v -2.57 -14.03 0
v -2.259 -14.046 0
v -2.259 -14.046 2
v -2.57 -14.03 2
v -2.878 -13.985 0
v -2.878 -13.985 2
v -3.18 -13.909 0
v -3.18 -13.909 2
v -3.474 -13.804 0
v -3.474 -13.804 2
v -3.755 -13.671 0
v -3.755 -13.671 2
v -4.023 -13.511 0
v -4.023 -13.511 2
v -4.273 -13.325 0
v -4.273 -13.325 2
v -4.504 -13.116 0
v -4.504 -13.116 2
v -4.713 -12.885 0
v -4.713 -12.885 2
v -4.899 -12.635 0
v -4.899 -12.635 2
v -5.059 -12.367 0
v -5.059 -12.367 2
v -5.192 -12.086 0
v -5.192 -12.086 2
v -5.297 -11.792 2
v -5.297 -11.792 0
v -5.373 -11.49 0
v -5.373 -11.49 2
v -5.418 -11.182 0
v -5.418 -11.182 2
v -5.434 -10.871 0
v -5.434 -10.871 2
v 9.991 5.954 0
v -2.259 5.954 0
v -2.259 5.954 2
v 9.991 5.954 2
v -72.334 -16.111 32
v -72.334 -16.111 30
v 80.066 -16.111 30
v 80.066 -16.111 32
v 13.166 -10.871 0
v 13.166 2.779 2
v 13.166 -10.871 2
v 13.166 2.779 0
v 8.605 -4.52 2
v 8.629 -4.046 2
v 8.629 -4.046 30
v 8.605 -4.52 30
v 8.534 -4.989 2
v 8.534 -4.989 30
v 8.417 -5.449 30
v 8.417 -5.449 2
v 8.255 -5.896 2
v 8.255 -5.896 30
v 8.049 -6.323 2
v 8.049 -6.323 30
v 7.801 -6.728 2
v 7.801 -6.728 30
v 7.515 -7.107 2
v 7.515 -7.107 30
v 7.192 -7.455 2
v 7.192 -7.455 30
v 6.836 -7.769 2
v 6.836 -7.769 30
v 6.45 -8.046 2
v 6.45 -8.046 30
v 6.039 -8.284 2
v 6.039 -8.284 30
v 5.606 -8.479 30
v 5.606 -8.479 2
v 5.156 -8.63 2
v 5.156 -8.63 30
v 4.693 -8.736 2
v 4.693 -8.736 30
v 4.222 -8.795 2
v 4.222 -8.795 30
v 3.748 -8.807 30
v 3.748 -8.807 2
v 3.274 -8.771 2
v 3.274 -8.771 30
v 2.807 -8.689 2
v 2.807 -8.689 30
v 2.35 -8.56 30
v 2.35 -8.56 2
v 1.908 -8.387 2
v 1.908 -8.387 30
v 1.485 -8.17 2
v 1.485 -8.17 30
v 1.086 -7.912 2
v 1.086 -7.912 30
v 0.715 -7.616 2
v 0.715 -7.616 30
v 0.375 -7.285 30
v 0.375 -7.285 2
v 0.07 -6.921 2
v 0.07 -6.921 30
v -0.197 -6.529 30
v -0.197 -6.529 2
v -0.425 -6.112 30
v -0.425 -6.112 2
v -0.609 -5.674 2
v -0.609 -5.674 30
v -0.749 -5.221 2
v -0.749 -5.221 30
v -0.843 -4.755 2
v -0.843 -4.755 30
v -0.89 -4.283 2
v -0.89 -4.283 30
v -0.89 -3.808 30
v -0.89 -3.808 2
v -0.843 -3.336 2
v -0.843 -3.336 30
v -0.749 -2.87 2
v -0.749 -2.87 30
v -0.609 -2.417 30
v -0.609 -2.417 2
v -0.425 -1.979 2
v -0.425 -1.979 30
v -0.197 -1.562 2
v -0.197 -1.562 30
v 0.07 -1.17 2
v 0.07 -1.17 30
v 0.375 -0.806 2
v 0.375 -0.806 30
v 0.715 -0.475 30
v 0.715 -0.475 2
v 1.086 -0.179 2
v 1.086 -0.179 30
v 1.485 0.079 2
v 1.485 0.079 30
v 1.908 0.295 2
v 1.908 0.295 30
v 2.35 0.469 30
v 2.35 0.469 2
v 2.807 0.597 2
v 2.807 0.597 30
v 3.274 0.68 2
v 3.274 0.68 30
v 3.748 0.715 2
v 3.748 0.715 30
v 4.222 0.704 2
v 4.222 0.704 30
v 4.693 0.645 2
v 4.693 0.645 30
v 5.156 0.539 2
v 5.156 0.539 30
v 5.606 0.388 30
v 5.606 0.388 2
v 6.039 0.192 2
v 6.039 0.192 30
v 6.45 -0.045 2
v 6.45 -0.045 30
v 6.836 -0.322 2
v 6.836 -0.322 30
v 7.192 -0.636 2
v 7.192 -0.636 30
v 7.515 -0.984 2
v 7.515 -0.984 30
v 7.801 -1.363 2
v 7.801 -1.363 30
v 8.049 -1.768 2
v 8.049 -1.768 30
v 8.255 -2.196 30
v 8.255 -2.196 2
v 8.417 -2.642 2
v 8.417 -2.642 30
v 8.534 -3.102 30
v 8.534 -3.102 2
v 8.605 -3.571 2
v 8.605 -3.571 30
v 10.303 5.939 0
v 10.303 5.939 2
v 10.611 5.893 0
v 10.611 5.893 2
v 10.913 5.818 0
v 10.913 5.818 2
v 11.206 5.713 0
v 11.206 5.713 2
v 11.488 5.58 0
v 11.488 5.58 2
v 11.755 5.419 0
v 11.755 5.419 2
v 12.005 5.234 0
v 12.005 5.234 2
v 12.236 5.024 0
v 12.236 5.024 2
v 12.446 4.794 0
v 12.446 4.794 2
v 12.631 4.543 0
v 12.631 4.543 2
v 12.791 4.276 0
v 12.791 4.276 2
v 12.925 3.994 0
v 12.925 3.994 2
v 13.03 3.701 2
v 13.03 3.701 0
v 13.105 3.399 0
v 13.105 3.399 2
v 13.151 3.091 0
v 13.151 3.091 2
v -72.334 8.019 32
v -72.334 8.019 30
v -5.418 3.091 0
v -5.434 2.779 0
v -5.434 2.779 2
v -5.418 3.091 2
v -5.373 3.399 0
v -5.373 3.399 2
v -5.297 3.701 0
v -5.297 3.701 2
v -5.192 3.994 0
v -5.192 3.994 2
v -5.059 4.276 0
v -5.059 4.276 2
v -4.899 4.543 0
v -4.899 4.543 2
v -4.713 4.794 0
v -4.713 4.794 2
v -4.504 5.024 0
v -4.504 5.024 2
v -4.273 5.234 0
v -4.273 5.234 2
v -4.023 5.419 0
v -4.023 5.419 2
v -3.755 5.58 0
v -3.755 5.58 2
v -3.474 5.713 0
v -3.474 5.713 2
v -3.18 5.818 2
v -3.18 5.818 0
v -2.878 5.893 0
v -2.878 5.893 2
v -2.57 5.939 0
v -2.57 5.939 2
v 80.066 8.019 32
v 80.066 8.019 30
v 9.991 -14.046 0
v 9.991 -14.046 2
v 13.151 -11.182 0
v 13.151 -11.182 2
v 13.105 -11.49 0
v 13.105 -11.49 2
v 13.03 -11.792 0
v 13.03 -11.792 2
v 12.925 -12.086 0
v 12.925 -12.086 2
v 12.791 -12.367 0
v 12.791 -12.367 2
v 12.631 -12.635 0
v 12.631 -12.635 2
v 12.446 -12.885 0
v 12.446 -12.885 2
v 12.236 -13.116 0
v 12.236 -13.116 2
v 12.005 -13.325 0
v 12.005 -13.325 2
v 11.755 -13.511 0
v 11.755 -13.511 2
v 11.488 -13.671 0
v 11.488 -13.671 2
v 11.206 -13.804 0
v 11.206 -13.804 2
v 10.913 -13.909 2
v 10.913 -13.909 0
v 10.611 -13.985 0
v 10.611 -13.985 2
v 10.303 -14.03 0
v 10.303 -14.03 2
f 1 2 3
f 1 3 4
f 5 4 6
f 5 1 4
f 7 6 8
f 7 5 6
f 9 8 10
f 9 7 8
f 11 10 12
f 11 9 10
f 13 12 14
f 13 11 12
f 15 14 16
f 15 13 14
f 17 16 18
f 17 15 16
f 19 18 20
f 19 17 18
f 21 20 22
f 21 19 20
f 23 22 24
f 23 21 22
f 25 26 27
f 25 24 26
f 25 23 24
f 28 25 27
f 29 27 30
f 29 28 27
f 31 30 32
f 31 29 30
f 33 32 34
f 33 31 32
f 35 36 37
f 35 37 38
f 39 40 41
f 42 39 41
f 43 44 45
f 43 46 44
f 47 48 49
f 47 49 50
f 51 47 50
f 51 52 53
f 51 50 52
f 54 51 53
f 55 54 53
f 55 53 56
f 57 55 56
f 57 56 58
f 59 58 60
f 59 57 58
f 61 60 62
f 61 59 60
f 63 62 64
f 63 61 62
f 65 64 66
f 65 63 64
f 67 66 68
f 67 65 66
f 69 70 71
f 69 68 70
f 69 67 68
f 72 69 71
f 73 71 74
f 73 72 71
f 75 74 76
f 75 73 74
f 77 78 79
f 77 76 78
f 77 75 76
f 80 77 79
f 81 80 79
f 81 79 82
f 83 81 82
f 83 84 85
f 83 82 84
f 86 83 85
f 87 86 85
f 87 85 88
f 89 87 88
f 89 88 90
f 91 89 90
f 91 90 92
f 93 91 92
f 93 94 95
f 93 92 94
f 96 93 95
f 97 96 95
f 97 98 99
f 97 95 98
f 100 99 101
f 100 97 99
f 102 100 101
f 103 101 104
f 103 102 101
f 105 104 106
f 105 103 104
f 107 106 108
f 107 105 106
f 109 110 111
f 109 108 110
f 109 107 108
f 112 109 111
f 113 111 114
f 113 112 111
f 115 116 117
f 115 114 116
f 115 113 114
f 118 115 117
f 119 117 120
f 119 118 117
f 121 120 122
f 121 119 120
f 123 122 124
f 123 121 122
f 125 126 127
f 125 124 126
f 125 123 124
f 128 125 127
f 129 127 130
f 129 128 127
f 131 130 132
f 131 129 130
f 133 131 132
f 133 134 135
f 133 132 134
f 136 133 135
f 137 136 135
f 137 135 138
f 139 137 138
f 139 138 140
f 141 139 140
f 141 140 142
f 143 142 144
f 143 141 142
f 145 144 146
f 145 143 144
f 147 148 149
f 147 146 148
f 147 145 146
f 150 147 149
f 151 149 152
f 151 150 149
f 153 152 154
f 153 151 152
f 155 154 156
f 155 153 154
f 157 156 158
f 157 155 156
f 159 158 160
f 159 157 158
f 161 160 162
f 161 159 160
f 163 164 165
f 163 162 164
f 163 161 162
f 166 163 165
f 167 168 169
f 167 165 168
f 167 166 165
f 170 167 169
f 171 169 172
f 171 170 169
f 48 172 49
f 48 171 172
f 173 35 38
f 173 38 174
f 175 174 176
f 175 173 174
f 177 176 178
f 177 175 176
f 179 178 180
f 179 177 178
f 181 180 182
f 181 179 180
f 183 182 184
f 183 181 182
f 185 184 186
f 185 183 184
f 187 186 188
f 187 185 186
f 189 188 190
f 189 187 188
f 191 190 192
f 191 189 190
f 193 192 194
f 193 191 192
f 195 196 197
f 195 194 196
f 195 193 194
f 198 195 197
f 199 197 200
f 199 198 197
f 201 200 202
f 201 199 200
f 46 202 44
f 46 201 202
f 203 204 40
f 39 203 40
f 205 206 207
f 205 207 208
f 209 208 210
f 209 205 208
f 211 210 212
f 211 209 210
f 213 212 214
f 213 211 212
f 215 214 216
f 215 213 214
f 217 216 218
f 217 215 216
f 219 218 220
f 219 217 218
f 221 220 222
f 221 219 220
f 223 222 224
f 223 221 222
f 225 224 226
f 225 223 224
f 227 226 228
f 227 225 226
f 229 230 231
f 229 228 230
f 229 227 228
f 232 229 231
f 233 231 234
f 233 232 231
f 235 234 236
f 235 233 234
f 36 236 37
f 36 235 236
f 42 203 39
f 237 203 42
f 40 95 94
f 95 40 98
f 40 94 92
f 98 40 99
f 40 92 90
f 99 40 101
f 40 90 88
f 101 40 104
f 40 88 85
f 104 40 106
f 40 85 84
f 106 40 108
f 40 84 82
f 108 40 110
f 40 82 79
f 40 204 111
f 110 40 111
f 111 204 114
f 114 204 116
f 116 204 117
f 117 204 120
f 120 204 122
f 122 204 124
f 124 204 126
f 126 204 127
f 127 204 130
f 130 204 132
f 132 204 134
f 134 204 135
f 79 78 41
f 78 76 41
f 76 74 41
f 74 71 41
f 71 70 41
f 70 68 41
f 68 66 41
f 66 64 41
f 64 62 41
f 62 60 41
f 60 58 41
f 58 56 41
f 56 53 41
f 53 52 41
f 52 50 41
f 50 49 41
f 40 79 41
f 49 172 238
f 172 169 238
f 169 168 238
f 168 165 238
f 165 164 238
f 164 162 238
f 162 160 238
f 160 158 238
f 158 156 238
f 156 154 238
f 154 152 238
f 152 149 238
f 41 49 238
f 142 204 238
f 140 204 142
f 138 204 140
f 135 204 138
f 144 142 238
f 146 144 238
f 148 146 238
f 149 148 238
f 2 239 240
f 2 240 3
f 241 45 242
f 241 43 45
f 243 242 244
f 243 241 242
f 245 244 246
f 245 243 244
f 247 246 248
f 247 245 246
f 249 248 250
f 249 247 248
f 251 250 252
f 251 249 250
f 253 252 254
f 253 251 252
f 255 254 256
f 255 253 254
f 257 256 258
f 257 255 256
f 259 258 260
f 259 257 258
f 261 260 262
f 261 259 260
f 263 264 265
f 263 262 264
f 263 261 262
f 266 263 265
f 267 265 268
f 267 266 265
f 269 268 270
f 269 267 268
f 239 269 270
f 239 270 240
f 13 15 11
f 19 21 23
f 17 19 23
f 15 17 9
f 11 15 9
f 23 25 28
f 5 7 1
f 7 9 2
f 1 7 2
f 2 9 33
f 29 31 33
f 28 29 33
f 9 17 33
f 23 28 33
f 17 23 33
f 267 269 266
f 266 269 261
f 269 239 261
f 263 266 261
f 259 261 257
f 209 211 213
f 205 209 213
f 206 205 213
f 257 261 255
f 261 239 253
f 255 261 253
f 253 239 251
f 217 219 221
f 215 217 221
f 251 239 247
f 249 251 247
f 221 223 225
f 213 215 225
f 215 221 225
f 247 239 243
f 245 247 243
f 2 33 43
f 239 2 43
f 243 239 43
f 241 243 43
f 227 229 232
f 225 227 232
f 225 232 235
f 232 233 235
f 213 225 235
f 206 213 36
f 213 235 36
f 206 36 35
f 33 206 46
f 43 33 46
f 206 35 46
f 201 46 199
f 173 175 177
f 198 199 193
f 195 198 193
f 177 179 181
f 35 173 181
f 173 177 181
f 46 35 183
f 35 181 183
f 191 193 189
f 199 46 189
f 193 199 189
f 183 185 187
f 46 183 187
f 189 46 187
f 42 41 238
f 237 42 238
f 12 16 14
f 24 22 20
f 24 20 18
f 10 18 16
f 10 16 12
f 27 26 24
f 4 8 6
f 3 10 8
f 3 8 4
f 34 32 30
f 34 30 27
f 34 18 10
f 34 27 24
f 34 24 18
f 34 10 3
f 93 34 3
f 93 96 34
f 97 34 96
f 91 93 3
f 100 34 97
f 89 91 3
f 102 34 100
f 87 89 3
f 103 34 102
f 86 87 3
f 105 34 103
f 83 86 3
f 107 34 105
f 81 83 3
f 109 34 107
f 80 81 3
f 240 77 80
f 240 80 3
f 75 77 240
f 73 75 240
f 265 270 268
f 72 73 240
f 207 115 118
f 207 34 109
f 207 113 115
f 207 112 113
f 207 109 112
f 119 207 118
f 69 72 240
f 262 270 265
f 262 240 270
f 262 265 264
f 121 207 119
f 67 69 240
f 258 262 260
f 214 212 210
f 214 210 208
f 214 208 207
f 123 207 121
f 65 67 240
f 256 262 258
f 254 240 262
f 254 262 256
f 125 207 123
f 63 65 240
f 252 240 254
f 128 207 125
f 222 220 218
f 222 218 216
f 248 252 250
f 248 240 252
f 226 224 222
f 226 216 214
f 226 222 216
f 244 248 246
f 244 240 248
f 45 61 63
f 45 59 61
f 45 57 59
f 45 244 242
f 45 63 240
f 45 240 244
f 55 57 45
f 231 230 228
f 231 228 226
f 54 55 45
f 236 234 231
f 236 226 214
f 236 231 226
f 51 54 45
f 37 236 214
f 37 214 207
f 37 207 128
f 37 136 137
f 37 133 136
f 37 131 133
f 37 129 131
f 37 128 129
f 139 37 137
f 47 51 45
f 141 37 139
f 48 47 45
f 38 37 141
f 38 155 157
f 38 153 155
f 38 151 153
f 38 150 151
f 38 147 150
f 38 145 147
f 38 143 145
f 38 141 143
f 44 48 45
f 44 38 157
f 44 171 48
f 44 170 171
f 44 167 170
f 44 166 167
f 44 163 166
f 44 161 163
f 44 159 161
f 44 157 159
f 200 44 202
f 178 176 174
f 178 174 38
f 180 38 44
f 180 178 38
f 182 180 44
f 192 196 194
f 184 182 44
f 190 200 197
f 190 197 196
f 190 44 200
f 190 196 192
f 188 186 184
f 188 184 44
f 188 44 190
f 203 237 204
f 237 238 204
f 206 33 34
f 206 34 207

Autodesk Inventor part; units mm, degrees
ref_plane "YZ Plane" through (0, 0, 0) normal (1, 0, 0) x (0, 1, 0)
ref_plane "XZ Plane" through (0, 0, 0) normal (0, 1, 0) x (-1, 0, 0)
ref_plane "XY Plane" through (0, 0, 0) normal (0, 0, 1) x (1, 0, 0)
sketch "Sketch1" plane through (0, 0, 0) normal (0, 0, 1) x (1, 0, 0)
  line L0 (-2.2587, 5.9544) -> (9.9913, 5.9544)
  line L1 (13.1663, 2.7794) -> (13.1663, -10.8706)
  line L2 (9.9913, -14.0456) -> (-2.2587, -14.0456)
  line L3 (-5.4337, -10.8706) -> (-5.4337, 2.7794)
  arc A0 (13.1663, 2.7794) -> (9.9913, 5.9544) centre (9.9913, 2.7794) ccw
  arc A1 (9.9913, -14.0456) -> (13.1663, -10.8706) centre (9.9913, -10.8706) ccw
  arc A2 (-5.4337, -10.8706) -> (-2.2587, -14.0456) centre (-2.2587, -10.8706) ccw
  arc A3 (-2.2587, 5.9544) -> (-5.4337, 2.7794) centre (-2.2587, 2.7794) ccw
  point P0 (0, 0)
  point P1 (13.1663, -14.0456)
  point P2 (13.1663, 5.9544)
  point P3 (-5.4337, -14.0456)
  dimension "d0" = 18.6
  dimension "d1" = 20
  dimension "d2" = 3.175
extrude "Extrusion1" add sketch "Sketch1" along normal blind 2
sketch "Sketch2" plane through (0, 0, 2) normal (0, 0, 1) x (1, 0, 0)
  arc A0 (-2.2587, 5.9544) -> (-5.4337, 2.7794) centre (-2.2587, 2.7794) ccw projected
  arc A1 (9.9913, -14.0456) -> (13.1663, -10.8706) centre (9.9913, -10.8706) ccw projected
  line L0 (-2.2587, 2.7794) -> (9.9913, -10.8706) construction
  arc A2 (13.1663, 2.7794) -> (9.9913, 5.9544) centre (9.9913, 2.7794) ccw projected
  arc A3 (-5.4337, -10.8706) -> (-2.2587, -14.0456) centre (-2.2587, -10.8706) ccw projected
  line L1 (9.9913, 2.7794) -> (-2.2587, -10.8706) construction
  circle A4 centre (3.8663, -4.0456) radius 4.7625
  point P0 (0, 0)
  dimension "d5" = 9.525
extrude "Extrusion2" add sketch "Sketch2" along normal blind 28
sketch "Sketch3" plane through (3.8663, -4.0456, 30) normal (0, 0, 1) x (1, 0, 0)
  line L0 (-76.2, -12.065) -> (76.2, -12.065)
  line L1 (76.2, -12.065) -> (76.2, 12.065)
  line L2 (76.2, 12.065) -> (-76.2, 12.065)
  line L3 (-76.2, 12.065) -> (-76.2, -12.065)
  line L4 (-76.2, -12.065) -> (76.2, 12.065) construction
  line L5 (76.2, -12.065) -> (-76.2, 12.065) construction
  point P0 (-3.8663, 4.0456)
  point P1 (0, 0)
  point P2 (0, 0)
  dimension "d8" = 24.13
  dimension "d9" = 152.4
extrude "Extrusion3" add sketch "Sketch3" along normal blind 2
properties part number "Hot Shoe Mount"
